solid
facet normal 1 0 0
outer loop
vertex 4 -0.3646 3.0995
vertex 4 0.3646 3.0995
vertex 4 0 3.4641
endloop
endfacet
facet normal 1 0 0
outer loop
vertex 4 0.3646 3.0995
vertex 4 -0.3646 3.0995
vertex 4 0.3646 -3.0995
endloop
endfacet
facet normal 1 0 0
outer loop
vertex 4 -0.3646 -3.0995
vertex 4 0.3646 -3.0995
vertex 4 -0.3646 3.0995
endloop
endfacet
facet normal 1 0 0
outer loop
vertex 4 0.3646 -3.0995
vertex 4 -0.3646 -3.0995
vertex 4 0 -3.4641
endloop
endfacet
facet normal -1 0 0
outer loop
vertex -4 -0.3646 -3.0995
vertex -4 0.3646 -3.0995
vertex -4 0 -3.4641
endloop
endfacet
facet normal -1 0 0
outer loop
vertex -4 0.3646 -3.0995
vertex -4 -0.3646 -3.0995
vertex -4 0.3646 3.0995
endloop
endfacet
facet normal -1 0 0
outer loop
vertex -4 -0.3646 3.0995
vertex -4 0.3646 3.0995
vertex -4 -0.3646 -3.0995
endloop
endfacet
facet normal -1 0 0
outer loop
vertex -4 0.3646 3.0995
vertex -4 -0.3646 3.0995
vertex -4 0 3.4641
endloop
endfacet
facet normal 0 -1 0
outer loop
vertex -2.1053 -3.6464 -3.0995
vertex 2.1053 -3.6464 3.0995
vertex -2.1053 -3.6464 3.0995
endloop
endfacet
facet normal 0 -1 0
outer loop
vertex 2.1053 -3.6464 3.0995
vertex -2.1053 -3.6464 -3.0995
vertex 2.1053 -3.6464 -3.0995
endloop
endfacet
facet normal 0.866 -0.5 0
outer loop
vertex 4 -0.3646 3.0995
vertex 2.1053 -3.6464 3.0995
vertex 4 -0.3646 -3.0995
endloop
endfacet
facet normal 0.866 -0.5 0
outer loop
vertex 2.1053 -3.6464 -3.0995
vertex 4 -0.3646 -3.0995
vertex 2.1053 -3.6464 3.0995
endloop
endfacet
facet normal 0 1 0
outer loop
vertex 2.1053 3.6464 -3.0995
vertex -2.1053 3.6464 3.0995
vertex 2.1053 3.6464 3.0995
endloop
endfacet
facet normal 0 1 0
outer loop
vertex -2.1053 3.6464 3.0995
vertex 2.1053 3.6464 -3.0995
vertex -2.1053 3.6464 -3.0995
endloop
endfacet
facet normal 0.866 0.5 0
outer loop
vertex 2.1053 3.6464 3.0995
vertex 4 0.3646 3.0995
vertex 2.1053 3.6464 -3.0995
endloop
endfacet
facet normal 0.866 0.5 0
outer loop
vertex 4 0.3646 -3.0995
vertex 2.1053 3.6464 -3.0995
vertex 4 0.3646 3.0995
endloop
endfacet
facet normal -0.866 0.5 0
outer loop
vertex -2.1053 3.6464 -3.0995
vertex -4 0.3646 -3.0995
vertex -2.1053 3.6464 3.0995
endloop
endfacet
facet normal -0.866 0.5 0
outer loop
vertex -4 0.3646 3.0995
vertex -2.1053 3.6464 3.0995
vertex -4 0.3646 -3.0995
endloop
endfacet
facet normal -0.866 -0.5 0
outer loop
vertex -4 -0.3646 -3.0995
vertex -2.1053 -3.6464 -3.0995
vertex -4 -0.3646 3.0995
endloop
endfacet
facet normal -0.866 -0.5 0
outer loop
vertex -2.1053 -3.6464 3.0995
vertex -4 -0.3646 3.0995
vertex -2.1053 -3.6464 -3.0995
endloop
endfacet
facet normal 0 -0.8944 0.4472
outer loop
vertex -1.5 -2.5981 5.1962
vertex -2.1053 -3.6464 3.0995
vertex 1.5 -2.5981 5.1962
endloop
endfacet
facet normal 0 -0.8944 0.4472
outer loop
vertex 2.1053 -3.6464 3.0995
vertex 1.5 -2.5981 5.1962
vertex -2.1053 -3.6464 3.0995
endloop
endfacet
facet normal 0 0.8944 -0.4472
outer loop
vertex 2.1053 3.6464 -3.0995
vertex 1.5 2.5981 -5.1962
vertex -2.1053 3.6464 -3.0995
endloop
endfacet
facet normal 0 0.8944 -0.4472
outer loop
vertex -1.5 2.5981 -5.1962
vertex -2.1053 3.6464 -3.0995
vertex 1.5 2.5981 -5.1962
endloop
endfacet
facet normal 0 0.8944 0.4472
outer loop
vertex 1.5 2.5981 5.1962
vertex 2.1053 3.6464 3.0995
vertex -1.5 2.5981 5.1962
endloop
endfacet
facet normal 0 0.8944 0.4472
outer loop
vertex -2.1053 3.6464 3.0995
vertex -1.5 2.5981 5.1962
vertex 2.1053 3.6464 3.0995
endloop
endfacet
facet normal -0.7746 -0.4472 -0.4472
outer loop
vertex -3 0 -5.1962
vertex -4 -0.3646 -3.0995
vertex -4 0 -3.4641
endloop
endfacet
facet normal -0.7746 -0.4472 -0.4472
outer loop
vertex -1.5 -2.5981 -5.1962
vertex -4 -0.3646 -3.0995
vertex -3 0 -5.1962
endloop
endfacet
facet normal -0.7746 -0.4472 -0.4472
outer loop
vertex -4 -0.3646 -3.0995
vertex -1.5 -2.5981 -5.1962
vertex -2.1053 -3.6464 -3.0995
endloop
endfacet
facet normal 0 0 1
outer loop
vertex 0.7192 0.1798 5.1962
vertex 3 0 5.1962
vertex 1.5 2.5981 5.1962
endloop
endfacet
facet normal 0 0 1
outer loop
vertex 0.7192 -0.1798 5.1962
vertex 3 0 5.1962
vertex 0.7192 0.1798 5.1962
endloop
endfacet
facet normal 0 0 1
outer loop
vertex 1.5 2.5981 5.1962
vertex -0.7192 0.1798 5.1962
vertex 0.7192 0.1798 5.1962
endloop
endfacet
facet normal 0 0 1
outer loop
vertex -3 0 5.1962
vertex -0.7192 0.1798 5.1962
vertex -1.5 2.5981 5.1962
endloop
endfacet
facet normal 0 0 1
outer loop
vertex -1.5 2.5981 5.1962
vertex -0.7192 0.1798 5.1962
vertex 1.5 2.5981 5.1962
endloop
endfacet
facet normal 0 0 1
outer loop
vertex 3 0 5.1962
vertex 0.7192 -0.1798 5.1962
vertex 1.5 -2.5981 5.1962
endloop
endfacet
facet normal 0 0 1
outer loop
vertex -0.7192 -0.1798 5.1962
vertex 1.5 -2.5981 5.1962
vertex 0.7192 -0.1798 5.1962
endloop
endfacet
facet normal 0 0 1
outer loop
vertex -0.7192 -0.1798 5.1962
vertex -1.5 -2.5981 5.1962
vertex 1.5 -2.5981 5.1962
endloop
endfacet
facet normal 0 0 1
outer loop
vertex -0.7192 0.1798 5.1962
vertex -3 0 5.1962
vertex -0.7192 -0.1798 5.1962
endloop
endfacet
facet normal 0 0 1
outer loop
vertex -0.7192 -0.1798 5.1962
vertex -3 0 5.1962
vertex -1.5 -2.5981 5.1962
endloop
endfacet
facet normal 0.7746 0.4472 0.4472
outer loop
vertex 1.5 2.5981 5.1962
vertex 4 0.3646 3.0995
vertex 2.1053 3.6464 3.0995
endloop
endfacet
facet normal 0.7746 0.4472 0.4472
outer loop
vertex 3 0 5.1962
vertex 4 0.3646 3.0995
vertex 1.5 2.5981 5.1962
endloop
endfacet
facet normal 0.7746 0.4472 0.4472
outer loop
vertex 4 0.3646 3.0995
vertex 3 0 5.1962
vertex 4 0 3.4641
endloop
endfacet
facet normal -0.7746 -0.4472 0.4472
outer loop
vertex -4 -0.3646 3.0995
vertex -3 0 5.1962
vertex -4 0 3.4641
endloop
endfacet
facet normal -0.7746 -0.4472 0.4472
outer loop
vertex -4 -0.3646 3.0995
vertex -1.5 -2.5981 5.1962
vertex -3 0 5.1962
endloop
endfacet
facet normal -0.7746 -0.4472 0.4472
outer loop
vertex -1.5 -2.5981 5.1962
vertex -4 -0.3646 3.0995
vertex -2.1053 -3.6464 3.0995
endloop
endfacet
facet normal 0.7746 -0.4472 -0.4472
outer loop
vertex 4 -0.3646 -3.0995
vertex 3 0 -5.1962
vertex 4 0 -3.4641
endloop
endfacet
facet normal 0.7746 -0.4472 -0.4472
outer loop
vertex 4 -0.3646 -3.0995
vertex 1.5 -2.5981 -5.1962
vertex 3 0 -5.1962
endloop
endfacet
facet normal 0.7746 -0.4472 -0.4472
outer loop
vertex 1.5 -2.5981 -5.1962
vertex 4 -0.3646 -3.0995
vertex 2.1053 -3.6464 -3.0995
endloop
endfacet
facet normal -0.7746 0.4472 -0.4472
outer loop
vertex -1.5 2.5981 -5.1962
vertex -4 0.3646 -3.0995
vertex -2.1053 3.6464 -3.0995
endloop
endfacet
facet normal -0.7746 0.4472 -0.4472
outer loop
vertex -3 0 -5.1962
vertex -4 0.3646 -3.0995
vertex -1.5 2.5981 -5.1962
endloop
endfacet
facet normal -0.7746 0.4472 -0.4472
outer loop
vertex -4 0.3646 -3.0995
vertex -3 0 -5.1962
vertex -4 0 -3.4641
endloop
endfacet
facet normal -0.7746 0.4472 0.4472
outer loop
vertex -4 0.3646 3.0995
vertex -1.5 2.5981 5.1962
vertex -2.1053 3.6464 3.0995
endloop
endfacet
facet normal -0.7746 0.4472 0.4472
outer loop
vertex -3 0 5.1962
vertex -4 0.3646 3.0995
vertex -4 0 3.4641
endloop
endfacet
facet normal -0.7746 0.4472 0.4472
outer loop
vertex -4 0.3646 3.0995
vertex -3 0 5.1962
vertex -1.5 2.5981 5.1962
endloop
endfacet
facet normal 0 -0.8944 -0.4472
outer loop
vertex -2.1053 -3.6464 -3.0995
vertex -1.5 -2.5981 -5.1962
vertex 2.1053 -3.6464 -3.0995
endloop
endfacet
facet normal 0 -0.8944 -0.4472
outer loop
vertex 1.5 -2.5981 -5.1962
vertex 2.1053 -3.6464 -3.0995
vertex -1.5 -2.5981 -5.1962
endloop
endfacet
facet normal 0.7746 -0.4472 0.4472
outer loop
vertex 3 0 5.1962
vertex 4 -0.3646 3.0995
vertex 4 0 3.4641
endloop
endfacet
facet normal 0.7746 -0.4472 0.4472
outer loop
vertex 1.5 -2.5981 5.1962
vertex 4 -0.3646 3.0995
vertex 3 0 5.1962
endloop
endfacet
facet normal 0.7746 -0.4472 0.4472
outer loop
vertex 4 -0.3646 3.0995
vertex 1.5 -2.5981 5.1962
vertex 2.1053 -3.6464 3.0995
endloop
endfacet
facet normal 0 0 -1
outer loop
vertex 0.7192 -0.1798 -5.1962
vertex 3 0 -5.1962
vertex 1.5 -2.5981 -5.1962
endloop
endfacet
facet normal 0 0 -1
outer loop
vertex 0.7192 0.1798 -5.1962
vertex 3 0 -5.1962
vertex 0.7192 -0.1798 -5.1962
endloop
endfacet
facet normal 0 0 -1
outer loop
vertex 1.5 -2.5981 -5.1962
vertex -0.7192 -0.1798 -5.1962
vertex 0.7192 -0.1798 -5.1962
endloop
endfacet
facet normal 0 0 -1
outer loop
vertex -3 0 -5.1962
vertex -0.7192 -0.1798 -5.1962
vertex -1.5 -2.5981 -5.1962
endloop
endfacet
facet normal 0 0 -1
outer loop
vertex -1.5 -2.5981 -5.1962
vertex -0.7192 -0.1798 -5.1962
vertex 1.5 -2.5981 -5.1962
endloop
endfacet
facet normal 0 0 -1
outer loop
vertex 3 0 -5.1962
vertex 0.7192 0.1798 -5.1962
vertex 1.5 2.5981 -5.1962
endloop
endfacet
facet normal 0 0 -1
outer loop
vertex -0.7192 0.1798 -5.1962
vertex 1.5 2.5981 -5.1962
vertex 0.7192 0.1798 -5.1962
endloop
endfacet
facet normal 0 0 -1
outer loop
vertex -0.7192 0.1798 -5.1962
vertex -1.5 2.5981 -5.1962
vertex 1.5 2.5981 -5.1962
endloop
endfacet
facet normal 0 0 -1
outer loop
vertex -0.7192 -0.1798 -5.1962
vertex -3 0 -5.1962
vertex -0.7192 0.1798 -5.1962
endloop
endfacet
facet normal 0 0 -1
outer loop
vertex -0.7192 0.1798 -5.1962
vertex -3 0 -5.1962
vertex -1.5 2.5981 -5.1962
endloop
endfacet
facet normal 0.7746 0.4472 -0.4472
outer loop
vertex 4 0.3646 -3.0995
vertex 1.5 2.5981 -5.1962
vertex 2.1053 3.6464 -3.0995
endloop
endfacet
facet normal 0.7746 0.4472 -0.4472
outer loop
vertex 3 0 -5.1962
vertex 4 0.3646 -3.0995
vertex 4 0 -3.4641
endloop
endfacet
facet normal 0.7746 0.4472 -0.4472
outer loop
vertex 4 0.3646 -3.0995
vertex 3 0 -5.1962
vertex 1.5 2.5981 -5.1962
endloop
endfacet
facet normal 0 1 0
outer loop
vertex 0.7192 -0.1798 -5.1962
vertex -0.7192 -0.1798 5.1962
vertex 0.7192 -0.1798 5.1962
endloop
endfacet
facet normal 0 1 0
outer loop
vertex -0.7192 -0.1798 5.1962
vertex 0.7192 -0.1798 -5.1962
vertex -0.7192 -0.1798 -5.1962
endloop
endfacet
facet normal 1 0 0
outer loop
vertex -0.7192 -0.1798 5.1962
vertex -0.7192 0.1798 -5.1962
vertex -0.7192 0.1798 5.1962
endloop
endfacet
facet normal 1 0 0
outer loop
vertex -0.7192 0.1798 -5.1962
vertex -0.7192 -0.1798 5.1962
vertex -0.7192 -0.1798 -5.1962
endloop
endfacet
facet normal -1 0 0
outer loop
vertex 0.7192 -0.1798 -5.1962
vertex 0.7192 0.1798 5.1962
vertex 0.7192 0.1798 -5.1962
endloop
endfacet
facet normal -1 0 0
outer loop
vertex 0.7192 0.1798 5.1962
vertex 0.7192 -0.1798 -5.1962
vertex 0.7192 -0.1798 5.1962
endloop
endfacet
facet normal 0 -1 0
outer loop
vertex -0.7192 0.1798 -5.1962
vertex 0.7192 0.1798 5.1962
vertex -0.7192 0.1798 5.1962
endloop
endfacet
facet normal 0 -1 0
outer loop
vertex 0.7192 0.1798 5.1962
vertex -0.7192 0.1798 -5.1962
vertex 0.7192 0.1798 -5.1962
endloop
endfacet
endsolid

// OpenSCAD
/*********************************************************************/
/* Parametric Fused Clapton helper tool for wire building.           */
/* Desgined by: mastabug                                             */
/* Version: 1                                                        */
/* Released: 2018-02-08                                              */
/*********************************************************************/

/*********************************************************************/
/* Parameters that you can adjust to accomodate your specific needs. */
/*********************************************************************/
width = 8;
length = 12;
wireAWG = 28;
wiresToFit=4;
gapTolerance=1.12; /*Multiplier, how much bigger to make the hole compared to wire. */

/*********************************************************************/
/* Don't change below this unless you really know what you're doing! */
/*********************************************************************/
$fn=6;

function awg_to_mm(awg) = 0.127 * pow(92.0,(36.0 - awg) / 39.0);

difference() {
	intersection() {
		cube([width, width, length], center = true);
		cylinder(r= width/1.9, h = length, center = true);
		sphere(r = length/2);
	}
    wireDiameter = awg_to_mm(wireAWG);
    echo("WIRE DIAMETER", wireDiameter);
	rotate(90,0,0) cube([wireDiameter*gapTolerance, wireDiameter* wiresToFit*gapTolerance, length], center = true);
}
